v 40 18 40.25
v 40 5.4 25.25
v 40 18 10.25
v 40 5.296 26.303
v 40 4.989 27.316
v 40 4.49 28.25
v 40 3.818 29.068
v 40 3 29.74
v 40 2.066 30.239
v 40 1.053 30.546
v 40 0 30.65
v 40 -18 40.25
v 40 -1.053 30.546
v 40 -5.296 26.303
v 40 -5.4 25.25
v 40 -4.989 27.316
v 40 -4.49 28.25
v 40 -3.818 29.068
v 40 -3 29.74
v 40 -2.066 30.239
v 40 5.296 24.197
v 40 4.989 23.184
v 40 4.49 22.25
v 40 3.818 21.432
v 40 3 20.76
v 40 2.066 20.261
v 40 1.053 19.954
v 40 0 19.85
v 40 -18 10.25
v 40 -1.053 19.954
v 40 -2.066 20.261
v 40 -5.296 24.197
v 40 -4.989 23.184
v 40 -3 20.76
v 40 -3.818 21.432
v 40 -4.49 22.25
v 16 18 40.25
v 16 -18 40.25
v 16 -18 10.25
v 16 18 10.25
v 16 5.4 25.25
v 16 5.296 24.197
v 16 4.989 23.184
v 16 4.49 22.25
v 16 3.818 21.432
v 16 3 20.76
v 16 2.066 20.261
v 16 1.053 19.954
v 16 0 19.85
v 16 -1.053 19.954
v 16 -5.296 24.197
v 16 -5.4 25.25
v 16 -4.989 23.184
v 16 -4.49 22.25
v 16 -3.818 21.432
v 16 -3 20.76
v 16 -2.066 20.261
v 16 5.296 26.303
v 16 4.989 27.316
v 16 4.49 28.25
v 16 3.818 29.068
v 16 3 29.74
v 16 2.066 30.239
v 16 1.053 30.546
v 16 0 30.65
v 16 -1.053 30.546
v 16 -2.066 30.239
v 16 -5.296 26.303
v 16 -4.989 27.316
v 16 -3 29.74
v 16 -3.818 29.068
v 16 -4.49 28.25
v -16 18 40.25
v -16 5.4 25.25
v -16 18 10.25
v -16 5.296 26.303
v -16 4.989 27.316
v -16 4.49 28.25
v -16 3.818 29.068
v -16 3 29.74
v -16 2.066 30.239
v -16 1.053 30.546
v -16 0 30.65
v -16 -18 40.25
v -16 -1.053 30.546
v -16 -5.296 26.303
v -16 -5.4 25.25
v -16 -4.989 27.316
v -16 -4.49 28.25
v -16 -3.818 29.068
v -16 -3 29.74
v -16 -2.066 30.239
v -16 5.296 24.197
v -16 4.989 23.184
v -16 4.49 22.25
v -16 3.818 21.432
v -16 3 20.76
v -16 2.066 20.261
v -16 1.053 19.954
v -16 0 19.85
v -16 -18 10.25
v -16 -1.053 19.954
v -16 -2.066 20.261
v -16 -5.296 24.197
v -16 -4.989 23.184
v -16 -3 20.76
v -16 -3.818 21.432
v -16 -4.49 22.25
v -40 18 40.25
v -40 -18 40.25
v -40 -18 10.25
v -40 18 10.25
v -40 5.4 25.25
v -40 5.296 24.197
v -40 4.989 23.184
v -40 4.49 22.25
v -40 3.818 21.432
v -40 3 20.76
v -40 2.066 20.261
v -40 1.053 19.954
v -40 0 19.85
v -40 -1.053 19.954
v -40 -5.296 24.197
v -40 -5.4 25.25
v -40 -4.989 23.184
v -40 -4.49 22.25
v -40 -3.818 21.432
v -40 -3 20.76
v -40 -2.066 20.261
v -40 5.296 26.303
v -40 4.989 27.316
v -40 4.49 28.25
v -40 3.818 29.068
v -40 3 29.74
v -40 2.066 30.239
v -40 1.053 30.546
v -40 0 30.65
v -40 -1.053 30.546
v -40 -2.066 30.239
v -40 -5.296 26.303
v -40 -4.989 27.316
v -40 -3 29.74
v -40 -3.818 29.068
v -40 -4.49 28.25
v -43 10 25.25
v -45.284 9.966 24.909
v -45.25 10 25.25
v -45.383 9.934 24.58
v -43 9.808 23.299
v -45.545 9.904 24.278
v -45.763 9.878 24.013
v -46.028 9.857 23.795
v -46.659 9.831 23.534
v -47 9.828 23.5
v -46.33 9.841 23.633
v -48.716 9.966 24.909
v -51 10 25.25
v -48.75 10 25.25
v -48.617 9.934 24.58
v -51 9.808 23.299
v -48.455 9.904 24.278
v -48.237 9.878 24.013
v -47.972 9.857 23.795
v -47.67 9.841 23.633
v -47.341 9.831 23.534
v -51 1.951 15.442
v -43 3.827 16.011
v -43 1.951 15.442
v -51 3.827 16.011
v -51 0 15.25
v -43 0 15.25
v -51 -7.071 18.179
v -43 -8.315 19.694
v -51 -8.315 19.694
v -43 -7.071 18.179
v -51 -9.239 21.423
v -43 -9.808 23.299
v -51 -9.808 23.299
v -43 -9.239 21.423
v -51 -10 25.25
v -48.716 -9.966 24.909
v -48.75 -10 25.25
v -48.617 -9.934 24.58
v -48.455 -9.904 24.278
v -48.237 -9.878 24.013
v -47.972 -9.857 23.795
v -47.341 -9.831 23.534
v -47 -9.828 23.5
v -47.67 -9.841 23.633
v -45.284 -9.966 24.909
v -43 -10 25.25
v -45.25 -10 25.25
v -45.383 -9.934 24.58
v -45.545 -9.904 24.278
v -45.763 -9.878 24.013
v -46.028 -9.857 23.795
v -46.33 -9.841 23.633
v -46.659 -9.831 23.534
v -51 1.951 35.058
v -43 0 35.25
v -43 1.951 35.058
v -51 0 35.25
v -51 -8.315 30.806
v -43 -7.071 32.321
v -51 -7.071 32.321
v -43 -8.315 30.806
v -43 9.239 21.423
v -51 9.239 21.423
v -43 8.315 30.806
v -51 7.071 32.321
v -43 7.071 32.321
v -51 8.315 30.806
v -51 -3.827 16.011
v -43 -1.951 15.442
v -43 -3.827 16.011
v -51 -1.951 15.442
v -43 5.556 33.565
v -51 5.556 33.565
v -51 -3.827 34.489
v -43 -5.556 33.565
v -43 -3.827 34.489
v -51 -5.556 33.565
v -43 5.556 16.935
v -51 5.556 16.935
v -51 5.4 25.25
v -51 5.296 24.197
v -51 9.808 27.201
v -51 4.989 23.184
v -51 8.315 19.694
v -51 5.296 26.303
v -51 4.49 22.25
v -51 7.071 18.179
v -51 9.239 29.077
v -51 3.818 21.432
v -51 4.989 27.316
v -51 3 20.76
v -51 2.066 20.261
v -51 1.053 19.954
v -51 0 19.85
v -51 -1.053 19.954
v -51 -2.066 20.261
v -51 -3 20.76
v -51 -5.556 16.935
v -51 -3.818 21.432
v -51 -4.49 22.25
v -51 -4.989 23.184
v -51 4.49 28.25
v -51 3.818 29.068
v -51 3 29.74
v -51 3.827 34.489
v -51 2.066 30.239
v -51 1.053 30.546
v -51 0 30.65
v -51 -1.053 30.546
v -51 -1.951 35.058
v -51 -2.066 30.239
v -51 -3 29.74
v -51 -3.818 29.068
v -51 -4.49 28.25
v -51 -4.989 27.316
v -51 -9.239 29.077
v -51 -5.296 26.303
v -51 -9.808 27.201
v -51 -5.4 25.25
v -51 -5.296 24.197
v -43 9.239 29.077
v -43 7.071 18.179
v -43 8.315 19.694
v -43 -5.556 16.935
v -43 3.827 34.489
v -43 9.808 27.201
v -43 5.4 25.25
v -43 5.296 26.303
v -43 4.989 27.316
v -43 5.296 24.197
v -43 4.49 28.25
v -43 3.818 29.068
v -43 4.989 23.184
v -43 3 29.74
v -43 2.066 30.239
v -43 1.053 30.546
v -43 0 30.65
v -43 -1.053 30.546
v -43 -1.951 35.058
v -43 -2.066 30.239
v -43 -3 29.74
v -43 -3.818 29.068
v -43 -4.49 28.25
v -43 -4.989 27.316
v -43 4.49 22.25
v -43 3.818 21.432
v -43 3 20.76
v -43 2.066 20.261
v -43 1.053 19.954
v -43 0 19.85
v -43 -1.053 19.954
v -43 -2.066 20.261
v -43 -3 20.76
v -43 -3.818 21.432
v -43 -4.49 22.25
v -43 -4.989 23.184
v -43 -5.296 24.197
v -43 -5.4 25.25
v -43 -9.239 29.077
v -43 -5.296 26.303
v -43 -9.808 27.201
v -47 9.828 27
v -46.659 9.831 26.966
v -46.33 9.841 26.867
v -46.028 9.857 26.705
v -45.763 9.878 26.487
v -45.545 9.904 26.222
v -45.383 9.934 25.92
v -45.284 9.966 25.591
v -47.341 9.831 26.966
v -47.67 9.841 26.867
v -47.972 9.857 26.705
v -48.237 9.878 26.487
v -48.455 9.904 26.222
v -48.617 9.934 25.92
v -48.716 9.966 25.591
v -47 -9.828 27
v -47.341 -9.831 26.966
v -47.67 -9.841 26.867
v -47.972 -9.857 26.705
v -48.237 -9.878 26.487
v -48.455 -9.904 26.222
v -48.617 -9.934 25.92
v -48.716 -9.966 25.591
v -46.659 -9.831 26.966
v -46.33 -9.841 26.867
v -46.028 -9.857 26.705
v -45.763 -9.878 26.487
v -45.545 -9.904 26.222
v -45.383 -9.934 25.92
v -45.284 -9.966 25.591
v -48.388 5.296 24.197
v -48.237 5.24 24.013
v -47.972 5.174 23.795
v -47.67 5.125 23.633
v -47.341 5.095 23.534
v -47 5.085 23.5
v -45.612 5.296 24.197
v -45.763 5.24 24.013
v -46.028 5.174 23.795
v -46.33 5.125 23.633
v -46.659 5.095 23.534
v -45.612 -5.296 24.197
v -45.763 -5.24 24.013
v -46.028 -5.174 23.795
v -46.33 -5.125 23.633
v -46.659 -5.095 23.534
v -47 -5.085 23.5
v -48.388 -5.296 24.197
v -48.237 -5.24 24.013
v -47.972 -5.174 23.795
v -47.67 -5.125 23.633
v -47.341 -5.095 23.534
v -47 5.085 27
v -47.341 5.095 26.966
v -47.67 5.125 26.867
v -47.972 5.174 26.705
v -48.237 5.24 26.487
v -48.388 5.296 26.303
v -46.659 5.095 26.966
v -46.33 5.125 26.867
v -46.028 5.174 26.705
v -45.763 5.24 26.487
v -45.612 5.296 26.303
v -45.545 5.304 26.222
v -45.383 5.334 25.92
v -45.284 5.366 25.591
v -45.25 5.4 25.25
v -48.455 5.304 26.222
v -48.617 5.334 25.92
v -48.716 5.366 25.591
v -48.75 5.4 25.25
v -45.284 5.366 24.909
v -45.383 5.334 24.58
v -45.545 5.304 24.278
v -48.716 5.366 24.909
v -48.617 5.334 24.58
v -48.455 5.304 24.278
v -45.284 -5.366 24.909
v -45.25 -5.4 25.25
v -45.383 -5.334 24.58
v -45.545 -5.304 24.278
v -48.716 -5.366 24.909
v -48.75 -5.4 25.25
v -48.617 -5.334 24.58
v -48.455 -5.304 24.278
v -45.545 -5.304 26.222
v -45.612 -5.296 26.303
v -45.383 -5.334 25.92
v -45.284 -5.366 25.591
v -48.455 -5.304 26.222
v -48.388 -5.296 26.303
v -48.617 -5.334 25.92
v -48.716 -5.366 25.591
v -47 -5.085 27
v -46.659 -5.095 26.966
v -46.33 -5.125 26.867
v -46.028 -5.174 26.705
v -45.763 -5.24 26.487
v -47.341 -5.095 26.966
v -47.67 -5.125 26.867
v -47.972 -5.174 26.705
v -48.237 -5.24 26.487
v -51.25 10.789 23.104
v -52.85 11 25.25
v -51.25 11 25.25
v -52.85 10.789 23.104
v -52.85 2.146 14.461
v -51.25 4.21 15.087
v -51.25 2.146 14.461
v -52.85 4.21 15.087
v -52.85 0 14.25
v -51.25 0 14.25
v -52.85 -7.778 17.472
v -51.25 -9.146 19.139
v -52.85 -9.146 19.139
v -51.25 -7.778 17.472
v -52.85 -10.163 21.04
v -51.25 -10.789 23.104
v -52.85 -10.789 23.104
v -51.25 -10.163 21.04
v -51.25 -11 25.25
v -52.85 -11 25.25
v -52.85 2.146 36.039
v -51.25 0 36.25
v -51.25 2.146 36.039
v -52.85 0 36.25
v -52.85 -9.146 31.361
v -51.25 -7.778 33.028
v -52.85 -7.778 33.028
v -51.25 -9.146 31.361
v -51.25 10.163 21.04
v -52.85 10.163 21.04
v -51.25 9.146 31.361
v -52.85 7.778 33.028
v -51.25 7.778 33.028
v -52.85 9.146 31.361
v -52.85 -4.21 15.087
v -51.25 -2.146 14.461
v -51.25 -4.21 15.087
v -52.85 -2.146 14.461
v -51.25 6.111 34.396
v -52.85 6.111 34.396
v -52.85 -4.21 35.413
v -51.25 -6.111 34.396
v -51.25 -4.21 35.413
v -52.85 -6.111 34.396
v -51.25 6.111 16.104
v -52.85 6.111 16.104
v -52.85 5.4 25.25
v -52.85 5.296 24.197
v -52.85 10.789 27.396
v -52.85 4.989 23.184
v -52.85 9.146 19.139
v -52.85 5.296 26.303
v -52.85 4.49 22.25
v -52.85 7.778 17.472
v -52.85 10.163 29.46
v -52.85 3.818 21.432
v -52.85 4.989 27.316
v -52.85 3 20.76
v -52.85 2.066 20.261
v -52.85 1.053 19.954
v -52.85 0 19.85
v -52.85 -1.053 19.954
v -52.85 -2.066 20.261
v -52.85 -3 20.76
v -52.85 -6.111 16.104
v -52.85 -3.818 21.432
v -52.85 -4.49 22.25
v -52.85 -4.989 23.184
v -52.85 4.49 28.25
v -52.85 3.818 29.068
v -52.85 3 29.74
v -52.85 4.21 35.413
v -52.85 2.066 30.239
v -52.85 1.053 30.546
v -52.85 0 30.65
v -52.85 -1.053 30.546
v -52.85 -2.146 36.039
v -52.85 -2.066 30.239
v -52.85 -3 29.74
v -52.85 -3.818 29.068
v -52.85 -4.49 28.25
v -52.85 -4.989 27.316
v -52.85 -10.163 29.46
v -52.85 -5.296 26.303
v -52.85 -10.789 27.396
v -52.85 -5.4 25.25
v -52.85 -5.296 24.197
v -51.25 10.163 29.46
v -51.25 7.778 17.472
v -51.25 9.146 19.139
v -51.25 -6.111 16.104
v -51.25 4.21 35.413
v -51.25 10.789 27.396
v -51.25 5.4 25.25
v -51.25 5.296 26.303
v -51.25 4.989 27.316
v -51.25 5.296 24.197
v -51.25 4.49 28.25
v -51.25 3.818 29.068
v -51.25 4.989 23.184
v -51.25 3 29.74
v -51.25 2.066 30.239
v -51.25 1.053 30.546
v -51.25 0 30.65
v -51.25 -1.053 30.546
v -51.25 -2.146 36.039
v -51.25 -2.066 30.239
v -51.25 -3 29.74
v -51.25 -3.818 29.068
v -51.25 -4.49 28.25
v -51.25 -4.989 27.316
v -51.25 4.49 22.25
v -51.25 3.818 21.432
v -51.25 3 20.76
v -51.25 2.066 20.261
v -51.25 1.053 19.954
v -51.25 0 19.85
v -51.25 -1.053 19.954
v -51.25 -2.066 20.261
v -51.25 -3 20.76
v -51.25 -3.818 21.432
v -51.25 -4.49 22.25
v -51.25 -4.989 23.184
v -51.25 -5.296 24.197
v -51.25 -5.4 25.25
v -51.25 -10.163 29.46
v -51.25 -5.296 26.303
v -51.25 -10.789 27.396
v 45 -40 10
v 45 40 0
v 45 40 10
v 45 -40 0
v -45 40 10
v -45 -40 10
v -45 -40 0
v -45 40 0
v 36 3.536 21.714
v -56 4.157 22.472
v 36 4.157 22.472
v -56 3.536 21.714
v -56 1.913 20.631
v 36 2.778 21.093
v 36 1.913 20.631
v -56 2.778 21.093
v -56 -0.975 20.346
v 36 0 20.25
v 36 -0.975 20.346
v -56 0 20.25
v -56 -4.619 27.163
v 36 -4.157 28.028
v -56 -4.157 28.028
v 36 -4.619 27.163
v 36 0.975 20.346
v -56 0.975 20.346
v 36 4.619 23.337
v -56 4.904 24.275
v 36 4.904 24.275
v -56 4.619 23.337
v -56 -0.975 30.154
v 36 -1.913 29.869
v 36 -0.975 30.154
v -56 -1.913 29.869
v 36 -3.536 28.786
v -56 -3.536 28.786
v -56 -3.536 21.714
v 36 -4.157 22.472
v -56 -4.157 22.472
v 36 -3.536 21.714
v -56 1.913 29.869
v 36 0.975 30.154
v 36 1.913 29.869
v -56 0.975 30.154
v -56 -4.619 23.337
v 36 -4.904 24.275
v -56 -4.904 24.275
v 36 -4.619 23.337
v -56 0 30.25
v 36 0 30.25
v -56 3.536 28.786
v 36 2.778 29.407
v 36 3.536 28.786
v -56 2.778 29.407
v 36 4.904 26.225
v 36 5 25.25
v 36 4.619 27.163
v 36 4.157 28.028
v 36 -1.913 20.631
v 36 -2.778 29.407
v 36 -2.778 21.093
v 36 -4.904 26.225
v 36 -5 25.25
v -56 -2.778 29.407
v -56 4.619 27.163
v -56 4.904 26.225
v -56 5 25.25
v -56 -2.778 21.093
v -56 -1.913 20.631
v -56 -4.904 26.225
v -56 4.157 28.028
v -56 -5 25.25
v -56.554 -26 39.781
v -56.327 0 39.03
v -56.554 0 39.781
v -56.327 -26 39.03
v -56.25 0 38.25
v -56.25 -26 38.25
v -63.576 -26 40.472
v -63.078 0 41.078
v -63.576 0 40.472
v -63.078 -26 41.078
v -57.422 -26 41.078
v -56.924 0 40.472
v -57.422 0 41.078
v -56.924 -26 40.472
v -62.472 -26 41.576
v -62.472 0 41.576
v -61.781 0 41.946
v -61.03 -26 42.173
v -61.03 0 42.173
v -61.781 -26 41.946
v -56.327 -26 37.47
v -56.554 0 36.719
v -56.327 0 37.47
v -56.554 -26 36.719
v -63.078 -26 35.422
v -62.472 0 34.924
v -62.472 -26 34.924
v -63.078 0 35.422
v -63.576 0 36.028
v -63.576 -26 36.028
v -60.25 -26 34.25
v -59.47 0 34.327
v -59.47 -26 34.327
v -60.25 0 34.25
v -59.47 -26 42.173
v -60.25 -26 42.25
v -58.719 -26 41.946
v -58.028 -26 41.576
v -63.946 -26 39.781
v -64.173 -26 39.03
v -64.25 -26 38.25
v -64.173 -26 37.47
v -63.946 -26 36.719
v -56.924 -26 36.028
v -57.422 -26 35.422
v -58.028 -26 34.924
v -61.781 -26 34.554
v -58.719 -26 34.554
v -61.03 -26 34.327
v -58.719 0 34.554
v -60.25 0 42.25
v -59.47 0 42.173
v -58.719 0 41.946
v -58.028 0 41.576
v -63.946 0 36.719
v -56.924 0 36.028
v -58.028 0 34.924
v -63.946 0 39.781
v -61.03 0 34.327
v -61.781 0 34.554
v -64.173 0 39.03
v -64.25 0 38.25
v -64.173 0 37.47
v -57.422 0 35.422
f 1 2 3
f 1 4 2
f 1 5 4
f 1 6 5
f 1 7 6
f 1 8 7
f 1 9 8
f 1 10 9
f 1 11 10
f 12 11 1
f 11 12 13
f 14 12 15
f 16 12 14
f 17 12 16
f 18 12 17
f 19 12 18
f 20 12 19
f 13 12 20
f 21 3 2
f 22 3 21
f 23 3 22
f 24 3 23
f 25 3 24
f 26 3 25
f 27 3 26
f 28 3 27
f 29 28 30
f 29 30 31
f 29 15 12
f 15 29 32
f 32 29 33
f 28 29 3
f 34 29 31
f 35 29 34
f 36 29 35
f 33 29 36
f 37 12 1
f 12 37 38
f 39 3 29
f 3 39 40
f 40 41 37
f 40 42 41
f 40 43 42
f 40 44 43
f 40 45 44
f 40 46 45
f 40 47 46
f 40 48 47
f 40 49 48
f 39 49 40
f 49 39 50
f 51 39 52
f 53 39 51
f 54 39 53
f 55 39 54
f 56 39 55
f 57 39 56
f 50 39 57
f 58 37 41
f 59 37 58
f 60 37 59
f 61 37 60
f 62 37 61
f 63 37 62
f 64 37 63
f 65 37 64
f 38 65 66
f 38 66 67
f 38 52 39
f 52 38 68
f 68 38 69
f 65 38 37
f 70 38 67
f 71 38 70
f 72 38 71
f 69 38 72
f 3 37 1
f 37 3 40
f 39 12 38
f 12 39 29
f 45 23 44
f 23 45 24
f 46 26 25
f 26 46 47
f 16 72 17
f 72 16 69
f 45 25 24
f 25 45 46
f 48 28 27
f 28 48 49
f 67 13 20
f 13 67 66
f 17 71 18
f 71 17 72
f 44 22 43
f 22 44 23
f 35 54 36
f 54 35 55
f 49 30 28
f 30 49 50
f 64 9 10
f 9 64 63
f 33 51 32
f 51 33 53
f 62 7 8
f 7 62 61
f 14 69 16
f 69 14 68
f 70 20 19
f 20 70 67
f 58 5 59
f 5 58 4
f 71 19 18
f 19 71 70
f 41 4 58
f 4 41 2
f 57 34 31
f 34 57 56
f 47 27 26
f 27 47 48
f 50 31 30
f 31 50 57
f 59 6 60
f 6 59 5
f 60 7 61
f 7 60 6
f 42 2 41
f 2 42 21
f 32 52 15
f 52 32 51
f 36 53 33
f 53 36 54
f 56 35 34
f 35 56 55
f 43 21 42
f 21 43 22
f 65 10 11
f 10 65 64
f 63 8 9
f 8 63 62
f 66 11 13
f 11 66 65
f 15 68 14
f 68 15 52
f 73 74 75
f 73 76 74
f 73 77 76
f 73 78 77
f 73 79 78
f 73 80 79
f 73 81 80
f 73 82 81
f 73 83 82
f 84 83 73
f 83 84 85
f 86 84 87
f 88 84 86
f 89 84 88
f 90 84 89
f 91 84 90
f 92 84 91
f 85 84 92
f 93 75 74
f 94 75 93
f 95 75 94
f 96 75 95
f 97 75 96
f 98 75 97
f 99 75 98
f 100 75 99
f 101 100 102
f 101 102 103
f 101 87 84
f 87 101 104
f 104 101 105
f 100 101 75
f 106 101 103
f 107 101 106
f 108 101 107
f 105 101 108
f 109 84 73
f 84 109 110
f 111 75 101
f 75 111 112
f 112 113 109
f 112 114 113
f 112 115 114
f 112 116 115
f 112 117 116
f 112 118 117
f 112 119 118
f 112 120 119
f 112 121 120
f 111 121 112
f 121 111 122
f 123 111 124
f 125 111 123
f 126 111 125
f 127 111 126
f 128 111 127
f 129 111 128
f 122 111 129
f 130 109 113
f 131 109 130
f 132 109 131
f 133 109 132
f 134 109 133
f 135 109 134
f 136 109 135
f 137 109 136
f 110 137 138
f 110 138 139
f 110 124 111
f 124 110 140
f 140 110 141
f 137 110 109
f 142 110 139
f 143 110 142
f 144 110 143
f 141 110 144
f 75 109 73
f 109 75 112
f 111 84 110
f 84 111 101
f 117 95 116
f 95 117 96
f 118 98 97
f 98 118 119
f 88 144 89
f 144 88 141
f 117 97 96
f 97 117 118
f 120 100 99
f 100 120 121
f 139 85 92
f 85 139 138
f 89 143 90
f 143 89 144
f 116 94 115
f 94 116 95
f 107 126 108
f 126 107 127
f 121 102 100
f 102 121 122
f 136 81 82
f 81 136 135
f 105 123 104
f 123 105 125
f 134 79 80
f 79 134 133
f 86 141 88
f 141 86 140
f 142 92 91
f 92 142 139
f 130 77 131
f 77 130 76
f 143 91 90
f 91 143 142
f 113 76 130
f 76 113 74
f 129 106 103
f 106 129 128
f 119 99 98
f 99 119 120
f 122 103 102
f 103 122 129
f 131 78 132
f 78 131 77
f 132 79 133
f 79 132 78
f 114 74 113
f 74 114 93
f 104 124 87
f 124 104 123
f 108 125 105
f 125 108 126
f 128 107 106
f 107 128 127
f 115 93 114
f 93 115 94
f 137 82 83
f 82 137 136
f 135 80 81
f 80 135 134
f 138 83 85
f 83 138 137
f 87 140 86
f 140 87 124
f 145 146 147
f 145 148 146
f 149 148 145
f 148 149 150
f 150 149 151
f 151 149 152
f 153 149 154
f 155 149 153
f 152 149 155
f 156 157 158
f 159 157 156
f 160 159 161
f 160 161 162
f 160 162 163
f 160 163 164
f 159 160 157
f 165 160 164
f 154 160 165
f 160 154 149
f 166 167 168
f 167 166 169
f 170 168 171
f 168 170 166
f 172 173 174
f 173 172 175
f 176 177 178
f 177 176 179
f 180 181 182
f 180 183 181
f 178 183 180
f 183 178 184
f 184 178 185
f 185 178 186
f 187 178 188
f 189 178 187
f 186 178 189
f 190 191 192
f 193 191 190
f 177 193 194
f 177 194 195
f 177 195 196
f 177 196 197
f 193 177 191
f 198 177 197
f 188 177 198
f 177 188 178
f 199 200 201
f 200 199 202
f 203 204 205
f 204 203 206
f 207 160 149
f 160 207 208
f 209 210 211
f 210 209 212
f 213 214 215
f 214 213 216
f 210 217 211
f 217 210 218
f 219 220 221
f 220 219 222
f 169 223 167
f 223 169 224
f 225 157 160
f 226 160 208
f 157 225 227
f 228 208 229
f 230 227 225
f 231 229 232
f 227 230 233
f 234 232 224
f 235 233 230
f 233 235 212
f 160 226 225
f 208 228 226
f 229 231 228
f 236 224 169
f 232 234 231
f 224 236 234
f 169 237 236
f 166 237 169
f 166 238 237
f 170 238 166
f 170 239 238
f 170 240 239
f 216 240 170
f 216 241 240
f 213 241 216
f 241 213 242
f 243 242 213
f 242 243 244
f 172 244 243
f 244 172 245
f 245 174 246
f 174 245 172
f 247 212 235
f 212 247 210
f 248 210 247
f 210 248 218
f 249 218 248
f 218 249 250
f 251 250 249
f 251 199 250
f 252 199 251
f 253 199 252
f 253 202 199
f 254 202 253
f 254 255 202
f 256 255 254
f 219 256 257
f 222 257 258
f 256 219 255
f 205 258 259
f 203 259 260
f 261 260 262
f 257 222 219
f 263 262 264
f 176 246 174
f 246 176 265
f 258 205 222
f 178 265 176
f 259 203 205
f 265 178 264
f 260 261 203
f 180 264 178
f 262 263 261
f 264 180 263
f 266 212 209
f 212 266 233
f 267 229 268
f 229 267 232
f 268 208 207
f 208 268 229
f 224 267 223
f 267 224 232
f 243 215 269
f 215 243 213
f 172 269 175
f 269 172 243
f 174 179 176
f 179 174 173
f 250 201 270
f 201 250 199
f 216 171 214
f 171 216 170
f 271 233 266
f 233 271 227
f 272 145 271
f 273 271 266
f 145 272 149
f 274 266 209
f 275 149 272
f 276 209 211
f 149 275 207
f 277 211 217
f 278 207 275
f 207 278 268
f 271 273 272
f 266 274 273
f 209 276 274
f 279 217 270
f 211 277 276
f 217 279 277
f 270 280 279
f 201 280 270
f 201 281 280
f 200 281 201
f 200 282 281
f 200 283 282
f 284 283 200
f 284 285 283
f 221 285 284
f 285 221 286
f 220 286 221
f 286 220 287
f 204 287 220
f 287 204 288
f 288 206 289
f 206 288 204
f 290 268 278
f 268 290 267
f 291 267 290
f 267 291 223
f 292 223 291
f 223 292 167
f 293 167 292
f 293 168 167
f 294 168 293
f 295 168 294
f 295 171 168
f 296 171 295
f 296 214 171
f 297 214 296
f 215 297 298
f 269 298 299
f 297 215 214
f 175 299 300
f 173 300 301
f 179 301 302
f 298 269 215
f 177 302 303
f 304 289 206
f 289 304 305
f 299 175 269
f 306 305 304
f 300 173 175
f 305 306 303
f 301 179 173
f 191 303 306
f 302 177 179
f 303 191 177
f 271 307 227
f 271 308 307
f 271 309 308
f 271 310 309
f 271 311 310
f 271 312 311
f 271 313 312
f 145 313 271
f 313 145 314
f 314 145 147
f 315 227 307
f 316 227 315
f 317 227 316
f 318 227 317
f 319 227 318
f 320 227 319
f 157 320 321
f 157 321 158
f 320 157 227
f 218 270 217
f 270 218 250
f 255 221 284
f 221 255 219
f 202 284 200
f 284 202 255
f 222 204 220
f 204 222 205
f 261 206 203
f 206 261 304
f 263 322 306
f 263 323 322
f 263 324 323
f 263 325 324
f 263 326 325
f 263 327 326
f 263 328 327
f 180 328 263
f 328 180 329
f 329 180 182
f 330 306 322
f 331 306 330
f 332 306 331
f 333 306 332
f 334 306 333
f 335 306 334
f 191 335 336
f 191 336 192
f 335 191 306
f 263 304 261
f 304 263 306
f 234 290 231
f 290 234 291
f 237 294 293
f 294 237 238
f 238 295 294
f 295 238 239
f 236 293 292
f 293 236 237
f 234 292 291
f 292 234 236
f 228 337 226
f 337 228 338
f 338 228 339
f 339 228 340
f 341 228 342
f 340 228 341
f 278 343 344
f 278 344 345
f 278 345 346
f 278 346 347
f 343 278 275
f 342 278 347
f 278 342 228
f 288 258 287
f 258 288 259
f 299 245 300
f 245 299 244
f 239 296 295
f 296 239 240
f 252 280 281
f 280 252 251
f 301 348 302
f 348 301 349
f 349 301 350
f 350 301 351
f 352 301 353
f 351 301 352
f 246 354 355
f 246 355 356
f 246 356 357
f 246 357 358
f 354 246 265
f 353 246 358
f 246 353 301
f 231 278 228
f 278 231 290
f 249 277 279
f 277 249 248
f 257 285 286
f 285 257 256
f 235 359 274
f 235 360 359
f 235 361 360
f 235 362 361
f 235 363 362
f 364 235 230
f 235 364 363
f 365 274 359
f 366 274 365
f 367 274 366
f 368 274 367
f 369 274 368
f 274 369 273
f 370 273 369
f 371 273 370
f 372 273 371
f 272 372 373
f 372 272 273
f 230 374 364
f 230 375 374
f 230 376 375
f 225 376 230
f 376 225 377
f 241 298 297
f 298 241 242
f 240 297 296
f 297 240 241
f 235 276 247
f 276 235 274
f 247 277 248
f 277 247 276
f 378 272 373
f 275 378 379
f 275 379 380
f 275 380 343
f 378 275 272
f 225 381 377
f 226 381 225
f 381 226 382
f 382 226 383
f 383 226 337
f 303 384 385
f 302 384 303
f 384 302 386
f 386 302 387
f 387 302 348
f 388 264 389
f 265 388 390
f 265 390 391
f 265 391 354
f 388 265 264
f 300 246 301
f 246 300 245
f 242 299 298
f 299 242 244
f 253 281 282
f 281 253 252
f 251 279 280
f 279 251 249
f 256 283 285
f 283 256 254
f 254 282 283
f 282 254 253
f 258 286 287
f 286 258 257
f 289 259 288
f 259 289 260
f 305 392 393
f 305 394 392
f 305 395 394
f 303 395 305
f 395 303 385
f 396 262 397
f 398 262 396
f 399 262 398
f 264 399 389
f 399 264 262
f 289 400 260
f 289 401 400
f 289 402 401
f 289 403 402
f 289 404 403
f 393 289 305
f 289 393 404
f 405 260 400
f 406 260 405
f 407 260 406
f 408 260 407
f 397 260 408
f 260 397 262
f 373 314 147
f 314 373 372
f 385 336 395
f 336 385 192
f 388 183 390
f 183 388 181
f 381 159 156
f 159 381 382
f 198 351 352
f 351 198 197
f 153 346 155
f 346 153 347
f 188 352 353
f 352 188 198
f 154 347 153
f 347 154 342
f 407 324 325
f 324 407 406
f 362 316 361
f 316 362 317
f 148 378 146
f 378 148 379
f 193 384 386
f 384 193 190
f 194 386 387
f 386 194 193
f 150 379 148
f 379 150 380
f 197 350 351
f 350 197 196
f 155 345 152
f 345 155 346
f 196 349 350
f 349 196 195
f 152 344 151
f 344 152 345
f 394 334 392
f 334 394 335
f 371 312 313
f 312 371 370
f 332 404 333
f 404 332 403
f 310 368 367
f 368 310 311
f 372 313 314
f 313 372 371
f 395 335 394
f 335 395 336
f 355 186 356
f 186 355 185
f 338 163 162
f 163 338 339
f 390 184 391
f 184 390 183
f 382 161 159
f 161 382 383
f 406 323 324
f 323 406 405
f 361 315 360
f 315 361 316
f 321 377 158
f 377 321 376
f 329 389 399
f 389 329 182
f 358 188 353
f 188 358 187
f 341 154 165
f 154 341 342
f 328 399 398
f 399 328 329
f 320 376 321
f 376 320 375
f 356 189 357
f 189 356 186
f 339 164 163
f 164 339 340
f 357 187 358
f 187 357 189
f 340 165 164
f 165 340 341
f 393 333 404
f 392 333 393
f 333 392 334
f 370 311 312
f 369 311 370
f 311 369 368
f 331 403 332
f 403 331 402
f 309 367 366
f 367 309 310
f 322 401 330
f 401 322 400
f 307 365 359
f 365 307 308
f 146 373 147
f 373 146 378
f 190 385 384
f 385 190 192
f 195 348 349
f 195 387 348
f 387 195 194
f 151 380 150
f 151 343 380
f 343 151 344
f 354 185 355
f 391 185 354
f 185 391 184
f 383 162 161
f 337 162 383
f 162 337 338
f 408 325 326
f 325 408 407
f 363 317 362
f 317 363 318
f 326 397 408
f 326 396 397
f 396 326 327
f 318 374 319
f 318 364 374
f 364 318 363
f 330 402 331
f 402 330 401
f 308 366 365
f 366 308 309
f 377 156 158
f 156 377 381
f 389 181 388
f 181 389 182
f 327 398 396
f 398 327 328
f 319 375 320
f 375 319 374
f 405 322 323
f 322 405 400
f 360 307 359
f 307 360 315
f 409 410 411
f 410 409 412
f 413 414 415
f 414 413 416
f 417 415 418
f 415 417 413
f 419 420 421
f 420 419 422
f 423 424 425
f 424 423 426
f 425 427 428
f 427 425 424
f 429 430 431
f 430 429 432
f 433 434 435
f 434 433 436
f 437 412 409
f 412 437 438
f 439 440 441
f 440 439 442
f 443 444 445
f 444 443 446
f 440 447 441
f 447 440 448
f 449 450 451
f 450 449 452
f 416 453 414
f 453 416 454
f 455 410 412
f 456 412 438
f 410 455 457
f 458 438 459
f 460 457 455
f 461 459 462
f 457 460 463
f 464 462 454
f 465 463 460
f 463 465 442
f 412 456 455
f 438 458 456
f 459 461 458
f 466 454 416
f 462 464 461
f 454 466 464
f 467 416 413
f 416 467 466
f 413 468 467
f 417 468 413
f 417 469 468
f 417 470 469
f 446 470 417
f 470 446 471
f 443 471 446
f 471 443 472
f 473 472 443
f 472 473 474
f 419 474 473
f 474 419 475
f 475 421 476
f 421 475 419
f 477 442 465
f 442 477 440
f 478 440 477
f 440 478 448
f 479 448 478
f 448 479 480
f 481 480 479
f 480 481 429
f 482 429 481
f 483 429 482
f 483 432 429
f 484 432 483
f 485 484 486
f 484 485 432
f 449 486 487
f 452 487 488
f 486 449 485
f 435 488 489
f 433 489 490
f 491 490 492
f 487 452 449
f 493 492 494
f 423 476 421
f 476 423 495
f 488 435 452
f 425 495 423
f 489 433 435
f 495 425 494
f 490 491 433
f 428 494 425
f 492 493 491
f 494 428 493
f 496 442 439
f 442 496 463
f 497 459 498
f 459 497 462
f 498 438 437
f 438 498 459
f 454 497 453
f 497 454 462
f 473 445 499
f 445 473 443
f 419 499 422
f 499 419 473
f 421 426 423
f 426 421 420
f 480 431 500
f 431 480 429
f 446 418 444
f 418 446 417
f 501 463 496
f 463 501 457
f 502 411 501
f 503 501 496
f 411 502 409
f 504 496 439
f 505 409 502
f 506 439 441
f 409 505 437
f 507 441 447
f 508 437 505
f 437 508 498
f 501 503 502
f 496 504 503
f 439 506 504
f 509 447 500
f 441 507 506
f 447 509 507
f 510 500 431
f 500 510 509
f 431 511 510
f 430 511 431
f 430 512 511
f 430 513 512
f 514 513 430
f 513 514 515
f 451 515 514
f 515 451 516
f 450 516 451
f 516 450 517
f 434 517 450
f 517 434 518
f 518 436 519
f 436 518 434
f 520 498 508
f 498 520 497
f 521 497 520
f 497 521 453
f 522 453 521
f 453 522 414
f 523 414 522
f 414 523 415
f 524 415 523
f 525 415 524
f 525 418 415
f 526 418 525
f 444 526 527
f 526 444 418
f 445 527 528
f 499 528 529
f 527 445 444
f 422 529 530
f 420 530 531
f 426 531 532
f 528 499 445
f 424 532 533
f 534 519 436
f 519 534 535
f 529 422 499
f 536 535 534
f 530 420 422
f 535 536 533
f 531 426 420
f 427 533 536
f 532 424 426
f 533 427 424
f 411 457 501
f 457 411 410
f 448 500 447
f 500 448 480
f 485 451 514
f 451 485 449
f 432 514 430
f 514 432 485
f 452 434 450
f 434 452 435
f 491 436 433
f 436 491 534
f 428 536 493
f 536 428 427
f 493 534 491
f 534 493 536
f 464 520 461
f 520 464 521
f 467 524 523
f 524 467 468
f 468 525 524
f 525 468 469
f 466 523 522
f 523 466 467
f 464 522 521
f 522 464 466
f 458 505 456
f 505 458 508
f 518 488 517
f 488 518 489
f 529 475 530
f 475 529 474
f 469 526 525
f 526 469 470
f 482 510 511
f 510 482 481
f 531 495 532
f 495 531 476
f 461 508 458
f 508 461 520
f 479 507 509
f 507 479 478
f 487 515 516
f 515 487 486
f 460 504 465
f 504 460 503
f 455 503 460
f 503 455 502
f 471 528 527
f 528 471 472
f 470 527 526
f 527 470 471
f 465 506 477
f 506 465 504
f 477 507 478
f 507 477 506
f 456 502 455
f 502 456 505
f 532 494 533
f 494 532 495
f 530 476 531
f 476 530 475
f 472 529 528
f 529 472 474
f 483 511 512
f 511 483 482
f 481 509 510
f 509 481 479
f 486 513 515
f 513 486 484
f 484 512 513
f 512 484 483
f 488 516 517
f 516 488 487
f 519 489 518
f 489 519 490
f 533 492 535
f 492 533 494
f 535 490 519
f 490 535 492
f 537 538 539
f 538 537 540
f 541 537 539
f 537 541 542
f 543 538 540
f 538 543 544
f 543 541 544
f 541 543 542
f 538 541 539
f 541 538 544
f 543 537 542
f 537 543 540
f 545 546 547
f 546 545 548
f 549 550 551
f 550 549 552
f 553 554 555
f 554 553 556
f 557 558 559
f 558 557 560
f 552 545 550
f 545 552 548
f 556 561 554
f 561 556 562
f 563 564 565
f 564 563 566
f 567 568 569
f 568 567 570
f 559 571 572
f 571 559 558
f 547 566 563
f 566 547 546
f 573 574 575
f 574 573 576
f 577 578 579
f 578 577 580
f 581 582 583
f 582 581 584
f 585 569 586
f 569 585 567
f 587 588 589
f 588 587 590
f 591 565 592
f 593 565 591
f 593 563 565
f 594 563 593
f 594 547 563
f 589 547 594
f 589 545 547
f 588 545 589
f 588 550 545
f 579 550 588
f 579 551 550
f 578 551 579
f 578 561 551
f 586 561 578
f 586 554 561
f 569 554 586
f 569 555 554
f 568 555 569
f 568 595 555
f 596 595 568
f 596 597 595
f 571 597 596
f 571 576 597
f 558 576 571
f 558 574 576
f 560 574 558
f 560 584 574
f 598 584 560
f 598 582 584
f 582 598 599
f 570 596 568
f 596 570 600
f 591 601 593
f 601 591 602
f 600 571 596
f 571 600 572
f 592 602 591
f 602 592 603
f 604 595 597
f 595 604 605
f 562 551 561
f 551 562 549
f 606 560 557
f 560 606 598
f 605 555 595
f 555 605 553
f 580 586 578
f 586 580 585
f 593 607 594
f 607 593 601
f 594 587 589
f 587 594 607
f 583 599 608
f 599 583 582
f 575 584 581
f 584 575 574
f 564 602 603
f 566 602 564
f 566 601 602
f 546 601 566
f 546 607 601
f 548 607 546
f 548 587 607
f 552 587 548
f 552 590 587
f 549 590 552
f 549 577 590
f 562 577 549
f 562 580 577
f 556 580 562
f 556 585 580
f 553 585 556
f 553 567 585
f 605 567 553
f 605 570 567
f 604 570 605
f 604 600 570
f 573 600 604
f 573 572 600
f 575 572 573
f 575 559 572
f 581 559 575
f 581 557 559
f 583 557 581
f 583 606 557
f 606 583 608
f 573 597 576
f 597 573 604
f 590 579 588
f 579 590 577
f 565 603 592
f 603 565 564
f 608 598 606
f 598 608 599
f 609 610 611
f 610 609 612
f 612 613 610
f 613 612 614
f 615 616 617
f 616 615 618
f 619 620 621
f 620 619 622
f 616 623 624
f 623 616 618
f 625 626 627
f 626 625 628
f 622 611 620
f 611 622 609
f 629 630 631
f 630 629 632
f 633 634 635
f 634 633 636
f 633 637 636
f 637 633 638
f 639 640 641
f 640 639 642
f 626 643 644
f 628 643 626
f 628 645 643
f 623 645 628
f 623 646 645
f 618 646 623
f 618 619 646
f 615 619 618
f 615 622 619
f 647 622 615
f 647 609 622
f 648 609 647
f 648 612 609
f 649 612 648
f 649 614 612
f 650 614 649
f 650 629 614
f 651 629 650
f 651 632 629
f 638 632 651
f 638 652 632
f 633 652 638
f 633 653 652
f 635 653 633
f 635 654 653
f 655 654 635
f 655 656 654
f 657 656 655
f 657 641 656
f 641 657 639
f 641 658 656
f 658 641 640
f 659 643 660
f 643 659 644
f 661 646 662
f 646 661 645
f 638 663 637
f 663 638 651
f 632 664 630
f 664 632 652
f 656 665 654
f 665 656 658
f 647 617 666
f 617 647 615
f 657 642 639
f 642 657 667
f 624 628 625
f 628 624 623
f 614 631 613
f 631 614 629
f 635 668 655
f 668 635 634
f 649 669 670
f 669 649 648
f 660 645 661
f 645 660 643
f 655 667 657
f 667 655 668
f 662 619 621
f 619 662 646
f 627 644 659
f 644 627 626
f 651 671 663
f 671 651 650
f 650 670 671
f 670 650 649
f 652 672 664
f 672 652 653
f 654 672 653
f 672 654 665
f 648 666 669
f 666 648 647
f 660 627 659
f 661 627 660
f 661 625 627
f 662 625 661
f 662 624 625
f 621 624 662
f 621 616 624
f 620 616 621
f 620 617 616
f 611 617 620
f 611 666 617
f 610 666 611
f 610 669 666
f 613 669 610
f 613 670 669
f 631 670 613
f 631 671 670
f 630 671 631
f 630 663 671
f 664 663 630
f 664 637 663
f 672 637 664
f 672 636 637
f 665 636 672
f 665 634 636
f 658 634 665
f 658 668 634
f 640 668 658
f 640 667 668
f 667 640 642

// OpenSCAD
$fn = 32;

// ------------------------------------------------------------------------
// Machine vise: screw d10, jaws 24 x 30 mm
// Every part is its own module, assembly() places every instance.
// ------------------------------------------------------------------------

// --- part 1 ---
module vise_bed() {
  difference() {
    translate([-45, -40, 0]) cube([90, 80, 10]);
  }
}

// --- part 2 ---
module vise_jaw() {
  difference() {
    translate([-12, -18, 0]) cube([24, 36, 30]);
    translate([0, 0, 15]) rotate([0, 90, 0]) cylinder(h = 26, d = 10.8, center = true);
  }
}

// --- part 3 ---
module vise_screw() {
  translate([0, 0, -46]) cylinder(h = 92, d = 10);
}

// --- part 4 ---
module screw_collar() {
  difference() {
    cylinder(h = 8, d = 20);
    translate([0, 0, -1]) cylinder(h = 10, d = 10.8);
    translate([0, 0, 4]) rotate([90, 0, 0]) cylinder(h = 22, d = 3.5, center = true);
  }
}

// --- part 5 ---
module screw_washer() {
  difference() {
      translate([0, 0, 0]) cylinder(h = 1.6, d = 22);
      translate([0, 0, -1]) cylinder(h = 3.6, d = 10.8);
    }
}

// --- part 6 ---
module vise_handle() {
  cylinder(h = 26, d = 8);
}

// --- assembly ---
module assembly() {
  color([0.80, 0.24, 0.20]) translate([0, 0, 0]) rotate([0, 0, 0]) vise_bed();
  color([0.20, 0.45, 0.75]) translate([28, 0, 10.25]) rotate([0, 0, 0]) vise_jaw();
  color([0.25, 0.62, 0.32]) translate([-28, 0, 10.25]) rotate([0, 0, 0]) vise_jaw();
  color([0.92, 0.70, 0.18]) translate([-10, 0, 25.25]) rotate([0, 90, 0]) vise_screw();
  color([0.58, 0.35, 0.70]) translate([-51, 0, 25.25]) rotate([0, 90, 0]) screw_collar();
  color([0.16, 0.66, 0.66]) translate([-52.85, 0, 25.25]) rotate([0, 90, 0]) screw_washer();
  color([0.85, 0.48, 0.18]) translate([-60.25, 0, 38.25]) rotate([90, 0, 0]) vise_handle();
}

assembly();
